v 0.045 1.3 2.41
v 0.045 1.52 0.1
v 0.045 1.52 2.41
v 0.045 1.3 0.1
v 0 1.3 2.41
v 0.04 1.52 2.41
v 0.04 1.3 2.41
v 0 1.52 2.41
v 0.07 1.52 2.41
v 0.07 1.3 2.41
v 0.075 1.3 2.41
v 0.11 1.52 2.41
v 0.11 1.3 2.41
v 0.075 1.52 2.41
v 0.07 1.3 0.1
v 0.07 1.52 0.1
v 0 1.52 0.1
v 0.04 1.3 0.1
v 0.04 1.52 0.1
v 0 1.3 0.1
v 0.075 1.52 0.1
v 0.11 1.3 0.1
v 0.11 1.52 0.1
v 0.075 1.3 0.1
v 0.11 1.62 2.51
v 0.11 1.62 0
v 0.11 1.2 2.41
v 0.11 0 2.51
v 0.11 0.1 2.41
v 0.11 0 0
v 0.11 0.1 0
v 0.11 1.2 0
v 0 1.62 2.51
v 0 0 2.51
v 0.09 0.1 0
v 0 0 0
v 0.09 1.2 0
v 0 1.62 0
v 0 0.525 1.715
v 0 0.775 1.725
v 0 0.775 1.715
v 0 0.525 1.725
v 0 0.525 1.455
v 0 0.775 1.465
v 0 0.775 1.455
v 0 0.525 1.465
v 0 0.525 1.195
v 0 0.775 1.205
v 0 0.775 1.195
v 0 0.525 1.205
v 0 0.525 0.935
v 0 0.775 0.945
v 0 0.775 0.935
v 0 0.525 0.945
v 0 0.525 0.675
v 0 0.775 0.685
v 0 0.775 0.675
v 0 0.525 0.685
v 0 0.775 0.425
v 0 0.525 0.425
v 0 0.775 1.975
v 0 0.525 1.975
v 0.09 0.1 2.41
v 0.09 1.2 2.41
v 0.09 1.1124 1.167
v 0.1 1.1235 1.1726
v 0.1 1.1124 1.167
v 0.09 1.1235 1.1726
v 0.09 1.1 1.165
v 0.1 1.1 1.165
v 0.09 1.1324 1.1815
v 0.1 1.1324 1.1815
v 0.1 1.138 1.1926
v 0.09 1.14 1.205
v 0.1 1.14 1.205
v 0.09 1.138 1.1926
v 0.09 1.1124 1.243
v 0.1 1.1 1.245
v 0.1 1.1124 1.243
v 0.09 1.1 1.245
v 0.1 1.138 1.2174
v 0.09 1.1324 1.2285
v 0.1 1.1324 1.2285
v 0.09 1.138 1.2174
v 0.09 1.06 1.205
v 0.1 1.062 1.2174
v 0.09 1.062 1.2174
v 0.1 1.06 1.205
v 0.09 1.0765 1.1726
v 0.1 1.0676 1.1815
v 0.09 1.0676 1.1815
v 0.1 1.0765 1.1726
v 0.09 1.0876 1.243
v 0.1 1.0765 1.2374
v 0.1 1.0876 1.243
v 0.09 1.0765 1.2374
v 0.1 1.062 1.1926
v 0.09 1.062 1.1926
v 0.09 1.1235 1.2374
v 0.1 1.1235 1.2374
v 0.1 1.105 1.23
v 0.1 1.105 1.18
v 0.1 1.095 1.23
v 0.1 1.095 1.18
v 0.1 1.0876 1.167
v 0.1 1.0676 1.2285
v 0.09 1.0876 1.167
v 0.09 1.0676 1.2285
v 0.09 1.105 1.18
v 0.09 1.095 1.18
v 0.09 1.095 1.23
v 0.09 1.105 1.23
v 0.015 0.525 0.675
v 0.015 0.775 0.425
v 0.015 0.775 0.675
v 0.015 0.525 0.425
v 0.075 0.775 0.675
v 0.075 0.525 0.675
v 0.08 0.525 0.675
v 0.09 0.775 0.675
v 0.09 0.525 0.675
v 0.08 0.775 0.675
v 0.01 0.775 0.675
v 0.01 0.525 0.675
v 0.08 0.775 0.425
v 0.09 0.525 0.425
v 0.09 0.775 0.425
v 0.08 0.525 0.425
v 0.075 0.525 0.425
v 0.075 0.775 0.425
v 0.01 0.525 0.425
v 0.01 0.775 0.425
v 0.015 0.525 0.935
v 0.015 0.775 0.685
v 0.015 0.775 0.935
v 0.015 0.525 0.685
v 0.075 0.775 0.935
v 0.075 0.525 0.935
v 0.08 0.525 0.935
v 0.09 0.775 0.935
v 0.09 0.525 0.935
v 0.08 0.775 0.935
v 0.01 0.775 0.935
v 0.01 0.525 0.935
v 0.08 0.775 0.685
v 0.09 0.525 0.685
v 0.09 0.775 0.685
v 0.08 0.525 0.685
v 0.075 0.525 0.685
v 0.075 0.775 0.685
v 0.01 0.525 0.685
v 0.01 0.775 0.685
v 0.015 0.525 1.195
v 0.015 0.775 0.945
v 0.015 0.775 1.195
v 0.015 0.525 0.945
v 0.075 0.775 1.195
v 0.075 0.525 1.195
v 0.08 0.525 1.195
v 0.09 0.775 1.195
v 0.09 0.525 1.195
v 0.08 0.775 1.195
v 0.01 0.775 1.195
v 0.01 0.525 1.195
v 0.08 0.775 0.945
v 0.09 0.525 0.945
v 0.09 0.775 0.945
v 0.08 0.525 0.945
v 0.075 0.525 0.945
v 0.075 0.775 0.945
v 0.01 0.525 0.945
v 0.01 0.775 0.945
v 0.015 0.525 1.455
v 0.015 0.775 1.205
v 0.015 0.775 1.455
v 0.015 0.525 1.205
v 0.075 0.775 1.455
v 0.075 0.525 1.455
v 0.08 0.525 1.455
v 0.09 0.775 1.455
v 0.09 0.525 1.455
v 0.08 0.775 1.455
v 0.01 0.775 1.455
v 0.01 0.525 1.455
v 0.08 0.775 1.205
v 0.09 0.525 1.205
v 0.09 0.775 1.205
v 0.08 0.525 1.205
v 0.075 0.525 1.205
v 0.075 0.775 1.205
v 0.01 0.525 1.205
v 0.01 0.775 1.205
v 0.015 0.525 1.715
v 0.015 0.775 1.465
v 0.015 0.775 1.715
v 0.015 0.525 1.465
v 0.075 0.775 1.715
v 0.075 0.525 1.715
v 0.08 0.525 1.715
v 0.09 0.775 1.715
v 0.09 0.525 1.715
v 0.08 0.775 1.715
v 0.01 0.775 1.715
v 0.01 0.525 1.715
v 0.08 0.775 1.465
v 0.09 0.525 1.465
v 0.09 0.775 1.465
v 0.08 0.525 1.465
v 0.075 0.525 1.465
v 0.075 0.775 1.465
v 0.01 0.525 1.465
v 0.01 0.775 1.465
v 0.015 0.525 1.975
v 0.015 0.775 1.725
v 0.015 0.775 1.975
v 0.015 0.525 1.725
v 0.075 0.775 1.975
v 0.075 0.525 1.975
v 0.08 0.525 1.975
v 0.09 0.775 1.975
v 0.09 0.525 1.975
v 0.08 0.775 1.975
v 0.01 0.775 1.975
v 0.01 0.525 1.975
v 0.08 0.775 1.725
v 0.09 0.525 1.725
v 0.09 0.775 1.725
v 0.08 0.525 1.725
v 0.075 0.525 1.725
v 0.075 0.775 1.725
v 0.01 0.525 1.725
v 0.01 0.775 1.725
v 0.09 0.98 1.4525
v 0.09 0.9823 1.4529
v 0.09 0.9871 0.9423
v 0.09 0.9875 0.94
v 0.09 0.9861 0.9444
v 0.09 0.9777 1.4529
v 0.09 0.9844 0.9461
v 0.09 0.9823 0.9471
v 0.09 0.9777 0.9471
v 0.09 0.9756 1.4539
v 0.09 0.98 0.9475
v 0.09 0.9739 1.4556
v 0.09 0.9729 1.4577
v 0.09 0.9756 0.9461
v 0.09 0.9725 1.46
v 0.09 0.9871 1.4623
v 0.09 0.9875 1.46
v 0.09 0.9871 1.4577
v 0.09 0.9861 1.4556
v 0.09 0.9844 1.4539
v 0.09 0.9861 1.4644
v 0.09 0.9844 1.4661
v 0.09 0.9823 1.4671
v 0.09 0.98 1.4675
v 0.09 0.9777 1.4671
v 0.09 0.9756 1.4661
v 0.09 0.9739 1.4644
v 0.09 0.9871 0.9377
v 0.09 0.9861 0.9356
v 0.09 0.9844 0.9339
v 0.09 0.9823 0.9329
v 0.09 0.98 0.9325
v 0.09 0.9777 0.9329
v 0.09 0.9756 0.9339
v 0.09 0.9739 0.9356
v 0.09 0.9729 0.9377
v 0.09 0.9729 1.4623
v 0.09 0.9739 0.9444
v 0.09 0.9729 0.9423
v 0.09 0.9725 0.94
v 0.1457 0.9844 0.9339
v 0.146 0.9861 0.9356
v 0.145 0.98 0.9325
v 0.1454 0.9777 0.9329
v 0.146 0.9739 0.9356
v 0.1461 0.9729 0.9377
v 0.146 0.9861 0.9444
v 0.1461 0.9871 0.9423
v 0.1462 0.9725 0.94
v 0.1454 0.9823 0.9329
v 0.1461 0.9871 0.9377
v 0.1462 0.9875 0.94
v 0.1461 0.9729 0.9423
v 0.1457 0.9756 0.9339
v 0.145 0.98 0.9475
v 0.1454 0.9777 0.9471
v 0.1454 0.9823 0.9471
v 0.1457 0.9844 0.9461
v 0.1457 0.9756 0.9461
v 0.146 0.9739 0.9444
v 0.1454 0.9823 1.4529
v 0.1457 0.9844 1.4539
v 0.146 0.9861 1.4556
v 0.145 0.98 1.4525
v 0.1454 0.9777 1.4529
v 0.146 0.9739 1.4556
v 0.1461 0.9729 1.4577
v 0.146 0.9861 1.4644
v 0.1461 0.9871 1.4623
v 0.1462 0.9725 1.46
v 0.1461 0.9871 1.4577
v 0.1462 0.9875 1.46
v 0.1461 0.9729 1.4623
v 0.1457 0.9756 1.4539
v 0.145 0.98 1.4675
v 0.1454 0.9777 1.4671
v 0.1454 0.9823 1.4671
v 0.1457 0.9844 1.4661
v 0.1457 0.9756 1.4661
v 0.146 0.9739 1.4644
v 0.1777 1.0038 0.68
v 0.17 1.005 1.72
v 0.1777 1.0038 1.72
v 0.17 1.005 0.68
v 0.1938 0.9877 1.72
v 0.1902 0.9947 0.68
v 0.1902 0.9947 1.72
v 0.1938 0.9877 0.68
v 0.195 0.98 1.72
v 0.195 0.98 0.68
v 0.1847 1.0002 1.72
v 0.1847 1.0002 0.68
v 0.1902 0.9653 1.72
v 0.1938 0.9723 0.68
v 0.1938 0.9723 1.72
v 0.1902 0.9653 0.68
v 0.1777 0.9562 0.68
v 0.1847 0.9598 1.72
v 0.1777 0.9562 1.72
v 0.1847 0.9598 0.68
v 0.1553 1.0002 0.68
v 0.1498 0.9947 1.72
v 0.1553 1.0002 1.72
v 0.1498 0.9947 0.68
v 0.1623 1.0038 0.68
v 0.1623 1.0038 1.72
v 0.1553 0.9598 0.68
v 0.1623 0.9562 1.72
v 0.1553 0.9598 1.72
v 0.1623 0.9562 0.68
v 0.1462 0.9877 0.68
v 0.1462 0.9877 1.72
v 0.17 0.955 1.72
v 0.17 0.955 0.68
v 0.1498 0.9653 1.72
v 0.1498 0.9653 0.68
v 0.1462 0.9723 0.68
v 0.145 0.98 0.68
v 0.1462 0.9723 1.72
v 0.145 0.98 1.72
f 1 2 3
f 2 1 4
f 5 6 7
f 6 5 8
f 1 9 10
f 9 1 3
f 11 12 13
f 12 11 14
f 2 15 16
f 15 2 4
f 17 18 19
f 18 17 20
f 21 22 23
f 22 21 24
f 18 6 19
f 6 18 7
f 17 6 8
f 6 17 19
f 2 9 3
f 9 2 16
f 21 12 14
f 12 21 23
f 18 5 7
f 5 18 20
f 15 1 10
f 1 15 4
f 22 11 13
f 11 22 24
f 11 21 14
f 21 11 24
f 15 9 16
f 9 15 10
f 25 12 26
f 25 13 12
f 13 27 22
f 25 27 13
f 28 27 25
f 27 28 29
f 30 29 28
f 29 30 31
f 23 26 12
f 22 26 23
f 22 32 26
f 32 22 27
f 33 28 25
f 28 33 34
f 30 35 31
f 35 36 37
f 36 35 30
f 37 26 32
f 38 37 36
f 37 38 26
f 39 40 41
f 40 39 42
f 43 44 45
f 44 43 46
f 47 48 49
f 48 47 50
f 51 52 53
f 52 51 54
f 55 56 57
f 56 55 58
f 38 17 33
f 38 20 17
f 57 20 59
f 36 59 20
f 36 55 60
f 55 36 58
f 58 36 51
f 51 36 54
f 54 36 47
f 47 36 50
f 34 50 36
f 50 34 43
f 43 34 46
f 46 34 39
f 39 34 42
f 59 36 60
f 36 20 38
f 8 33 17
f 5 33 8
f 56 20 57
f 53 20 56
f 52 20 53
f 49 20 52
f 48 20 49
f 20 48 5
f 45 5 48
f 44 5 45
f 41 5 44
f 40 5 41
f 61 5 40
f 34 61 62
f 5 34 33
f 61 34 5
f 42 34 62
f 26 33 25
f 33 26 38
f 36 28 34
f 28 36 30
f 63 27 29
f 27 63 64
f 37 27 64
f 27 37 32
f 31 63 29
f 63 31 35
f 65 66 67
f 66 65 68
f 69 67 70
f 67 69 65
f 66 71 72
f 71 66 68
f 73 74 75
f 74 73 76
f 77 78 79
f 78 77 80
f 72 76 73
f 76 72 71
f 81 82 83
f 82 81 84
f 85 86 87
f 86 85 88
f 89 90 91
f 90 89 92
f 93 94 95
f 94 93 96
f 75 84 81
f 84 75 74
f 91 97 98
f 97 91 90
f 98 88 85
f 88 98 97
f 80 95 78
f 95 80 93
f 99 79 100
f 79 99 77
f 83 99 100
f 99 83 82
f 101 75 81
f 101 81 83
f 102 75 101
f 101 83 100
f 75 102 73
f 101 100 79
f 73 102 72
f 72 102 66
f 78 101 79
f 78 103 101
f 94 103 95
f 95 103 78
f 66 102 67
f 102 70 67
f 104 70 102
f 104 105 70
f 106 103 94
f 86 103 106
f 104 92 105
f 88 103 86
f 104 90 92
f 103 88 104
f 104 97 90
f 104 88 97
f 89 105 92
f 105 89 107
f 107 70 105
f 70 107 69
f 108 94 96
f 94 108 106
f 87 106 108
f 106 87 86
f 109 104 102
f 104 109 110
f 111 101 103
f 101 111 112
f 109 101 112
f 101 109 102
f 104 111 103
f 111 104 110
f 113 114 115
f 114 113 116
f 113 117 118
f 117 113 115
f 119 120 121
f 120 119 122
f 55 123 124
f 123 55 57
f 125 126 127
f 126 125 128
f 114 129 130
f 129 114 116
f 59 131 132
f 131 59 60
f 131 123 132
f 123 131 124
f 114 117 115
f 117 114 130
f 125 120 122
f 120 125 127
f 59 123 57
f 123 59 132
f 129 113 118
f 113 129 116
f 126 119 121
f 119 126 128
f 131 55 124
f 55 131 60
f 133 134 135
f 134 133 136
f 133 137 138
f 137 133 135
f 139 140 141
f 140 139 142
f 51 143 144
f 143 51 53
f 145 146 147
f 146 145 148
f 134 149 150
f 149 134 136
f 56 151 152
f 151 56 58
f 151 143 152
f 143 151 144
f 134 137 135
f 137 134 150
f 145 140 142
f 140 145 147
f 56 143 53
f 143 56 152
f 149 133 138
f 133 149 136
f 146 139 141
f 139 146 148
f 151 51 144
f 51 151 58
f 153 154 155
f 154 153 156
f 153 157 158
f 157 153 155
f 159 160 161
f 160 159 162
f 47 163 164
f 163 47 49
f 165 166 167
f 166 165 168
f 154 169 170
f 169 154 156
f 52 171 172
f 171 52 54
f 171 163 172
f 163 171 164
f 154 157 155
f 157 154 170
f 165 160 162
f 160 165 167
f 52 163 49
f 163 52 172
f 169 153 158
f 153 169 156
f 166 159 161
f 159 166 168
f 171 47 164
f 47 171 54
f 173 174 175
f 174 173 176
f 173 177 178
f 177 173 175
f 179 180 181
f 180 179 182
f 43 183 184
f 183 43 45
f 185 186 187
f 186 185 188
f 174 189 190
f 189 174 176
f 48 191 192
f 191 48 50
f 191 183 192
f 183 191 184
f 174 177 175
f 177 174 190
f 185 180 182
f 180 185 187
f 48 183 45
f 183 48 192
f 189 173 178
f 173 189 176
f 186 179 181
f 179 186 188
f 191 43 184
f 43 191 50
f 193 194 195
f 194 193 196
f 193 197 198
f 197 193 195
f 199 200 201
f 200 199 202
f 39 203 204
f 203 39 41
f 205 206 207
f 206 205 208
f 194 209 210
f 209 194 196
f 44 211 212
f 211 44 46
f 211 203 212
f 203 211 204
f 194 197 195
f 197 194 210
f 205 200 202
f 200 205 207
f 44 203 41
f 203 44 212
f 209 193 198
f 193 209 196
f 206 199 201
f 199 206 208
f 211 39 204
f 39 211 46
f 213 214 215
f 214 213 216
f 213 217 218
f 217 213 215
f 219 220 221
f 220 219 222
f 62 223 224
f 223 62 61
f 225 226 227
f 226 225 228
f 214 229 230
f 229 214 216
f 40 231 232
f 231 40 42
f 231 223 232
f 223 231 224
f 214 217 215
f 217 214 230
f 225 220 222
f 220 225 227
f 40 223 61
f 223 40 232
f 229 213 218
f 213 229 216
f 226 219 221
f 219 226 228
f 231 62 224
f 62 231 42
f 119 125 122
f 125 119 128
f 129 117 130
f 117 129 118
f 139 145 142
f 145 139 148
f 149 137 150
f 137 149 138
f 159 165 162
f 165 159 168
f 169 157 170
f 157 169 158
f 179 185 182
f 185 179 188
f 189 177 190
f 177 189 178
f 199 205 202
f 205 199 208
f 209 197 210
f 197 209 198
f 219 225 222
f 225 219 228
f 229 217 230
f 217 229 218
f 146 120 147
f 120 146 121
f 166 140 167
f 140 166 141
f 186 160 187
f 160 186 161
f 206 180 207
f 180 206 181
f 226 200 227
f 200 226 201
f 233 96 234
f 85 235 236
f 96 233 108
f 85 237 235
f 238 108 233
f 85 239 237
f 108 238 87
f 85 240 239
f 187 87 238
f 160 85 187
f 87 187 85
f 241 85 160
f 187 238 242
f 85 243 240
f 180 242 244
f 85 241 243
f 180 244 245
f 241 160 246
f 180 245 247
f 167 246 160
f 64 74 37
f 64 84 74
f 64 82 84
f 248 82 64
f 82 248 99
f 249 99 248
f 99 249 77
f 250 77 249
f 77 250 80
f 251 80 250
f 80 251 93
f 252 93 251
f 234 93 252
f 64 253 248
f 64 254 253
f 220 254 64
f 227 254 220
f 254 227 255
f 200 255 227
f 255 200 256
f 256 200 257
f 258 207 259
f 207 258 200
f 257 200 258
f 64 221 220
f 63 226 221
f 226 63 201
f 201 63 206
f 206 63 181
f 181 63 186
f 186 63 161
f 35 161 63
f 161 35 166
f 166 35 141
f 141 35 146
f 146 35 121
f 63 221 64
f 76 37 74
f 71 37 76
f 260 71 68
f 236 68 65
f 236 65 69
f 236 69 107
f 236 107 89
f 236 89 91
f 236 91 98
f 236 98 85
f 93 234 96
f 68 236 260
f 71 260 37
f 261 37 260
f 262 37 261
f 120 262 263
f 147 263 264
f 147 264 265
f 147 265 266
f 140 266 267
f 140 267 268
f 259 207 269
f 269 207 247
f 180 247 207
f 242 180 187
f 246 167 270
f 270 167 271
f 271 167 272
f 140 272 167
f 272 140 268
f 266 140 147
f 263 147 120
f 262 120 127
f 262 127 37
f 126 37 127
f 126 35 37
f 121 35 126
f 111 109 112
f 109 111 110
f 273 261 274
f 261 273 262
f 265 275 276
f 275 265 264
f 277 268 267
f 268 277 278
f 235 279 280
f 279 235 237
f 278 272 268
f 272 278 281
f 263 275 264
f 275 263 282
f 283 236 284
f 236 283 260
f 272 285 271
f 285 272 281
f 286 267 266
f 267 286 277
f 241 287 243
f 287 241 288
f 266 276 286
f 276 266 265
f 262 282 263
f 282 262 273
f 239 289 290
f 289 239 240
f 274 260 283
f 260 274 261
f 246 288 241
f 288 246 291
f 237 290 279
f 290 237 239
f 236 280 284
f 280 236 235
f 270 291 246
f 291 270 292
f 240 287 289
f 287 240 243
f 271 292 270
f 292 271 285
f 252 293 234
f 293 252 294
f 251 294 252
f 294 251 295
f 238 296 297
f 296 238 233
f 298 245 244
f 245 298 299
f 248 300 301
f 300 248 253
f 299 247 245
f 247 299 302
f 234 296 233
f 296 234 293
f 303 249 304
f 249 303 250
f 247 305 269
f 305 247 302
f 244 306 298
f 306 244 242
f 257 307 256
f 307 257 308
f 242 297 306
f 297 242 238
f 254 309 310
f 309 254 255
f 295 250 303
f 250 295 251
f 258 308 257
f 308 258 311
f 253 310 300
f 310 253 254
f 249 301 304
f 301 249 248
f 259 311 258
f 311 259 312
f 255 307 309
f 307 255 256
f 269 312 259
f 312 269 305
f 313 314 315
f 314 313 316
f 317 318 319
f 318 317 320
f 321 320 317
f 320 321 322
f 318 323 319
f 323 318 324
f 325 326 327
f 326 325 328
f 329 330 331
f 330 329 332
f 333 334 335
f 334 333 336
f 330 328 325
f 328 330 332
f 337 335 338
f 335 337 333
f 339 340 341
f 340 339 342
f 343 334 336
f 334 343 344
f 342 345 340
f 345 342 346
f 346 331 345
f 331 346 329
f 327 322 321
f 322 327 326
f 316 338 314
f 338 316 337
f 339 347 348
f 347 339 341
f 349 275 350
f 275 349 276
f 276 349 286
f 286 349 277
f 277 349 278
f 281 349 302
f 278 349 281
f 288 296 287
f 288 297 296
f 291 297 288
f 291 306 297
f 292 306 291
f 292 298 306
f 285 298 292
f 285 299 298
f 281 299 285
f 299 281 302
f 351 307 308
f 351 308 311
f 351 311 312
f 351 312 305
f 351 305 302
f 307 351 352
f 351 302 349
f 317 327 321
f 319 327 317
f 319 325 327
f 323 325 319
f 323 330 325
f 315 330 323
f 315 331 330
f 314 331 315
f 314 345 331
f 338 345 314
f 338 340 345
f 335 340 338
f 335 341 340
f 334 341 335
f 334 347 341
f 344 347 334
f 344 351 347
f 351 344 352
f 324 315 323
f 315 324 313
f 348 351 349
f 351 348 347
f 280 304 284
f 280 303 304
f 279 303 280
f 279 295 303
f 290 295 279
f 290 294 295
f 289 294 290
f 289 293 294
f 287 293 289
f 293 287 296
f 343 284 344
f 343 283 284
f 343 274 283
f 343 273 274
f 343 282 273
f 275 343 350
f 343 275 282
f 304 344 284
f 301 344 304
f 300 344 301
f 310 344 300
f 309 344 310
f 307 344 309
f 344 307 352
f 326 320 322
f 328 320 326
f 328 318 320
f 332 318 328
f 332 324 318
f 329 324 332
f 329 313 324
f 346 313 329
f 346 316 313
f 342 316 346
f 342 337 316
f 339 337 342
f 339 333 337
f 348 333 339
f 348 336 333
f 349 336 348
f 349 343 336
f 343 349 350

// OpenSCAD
// hörmann-style door

$fn = 20;

xDim =  110;
yDim = 1620;
zDim = 2510;
frameThickness = 100;

doorYDim = 1100;
doorZDim = zDim - frameThickness;

windowXDim = 5;
windowYDim = (yDim - doorYDim -3*frameThickness);
windowZDim = (zDim - 2*frameThickness);

module door(
  tScale = 1.0
) {
  translate([0, frameThickness, 0])
  cube([tScale * xDim, doorYDim, doorZDim]);
}

module mainShape() {
  difference() {

    cube([xDim, yDim, zDim]);

    translate([-500, 0, 0])
    door(tScale = 10.0);

    translate([-5000, yDim - windowYDim - frameThickness, frameThickness])
    scale([10, 1, 1])
    cube([10000, windowYDim, zDim - 2*frameThickness]);
  }
}

module window() {
  translate([0, (yDim - windowYDim - frameThickness), frameThickness])
  cube([windowXDim, windowYDim, windowZDim]);
}

module windows() {
  translate([40, 0, 0]) window();
  translate([xDim - 40, 0, 0]) window();
}

hXDim = 250;
hYDim = 250;
hZDim = hYDim;
nH = 6;
tHZ = (10 + hYDim);
tHZDim = (tHZ * nH);

module hublot(
  xScale = 1.0
) {
  translate([0, frameThickness + doorYDim/2 - hYDim/2, 0])
  cube([(hXDim * xScale), hYDim, hZDim]);
}

module hublots(
  xScale = 1.0
) {
  base = (doorZDim/2 - tHZDim/2);
  translate([0, 0, 0*tHZ + base]) hublot(xScale);
  translate([0, 0, 1*tHZ + base]) hublot(xScale);
  translate([0, 0, 2*tHZ + base]) hublot(xScale);
  translate([0, 0, 3*tHZ + base]) hublot(xScale);
  translate([0, 0, 4*tHZ + base]) hublot(xScale);
  translate([0, 0, 5*tHZ + base]) hublot(xScale);
}

module handleHolder() {
  color([0.75, 0.75, 0.75, 1.0])
  translate([0, 60 + 920, 680])
  rotate([0, 90, 0])
  cylinder(d = 15, h = 150);
}

module lock() {
  translate([0, 1100, doorZDim/2])
  rotate([0, 90, 0])
  difference() {
    cylinder(d = 80, h = 100);
    translate([0, 0, 100]) cube([50, 10, 160], center = true);
  }
}

module completeDoor() {

  color([0.5, 0.5, 0.5, 1.0])
  lock();

  // holders
  translate([0, 0, 1*tHZ]) handleHolder();
  translate([0, 0, 3*tHZ]) handleHolder();

  // big handle
  color([0.75, 0.75, 0.75, 1.0])
  translate([170, 60 + 920, 680])
  cylinder(d = 50, h = 4 * tHZ);

  // back windows for hublots
  color([0, 0, 1, 0.2])
  translate([10, 0, 0])
  hublots(xScale = 0.02);

  // front windows for hublots
  color([0, 0, 1, 0.2])
  translate([xDim-35, 0, 0])
  hublots(xScale = 0.02);

  // door, with holes for hublots
  difference() {
    color([1, 1, 1, 1]) door(tScale = 90/110);
    color([0, 1, 1, 0]) translate([-100, 0, 0]) hublots();
  }
}

module frame() {
  color([0, 0, 1, 0.2]) windows();
  color([1, 0, 0, 1.0]) mainShape();
}

module assembly() {
  frame();
  completeDoor();
}

scale([0.001, 0.001, 0.001])
assembly();
